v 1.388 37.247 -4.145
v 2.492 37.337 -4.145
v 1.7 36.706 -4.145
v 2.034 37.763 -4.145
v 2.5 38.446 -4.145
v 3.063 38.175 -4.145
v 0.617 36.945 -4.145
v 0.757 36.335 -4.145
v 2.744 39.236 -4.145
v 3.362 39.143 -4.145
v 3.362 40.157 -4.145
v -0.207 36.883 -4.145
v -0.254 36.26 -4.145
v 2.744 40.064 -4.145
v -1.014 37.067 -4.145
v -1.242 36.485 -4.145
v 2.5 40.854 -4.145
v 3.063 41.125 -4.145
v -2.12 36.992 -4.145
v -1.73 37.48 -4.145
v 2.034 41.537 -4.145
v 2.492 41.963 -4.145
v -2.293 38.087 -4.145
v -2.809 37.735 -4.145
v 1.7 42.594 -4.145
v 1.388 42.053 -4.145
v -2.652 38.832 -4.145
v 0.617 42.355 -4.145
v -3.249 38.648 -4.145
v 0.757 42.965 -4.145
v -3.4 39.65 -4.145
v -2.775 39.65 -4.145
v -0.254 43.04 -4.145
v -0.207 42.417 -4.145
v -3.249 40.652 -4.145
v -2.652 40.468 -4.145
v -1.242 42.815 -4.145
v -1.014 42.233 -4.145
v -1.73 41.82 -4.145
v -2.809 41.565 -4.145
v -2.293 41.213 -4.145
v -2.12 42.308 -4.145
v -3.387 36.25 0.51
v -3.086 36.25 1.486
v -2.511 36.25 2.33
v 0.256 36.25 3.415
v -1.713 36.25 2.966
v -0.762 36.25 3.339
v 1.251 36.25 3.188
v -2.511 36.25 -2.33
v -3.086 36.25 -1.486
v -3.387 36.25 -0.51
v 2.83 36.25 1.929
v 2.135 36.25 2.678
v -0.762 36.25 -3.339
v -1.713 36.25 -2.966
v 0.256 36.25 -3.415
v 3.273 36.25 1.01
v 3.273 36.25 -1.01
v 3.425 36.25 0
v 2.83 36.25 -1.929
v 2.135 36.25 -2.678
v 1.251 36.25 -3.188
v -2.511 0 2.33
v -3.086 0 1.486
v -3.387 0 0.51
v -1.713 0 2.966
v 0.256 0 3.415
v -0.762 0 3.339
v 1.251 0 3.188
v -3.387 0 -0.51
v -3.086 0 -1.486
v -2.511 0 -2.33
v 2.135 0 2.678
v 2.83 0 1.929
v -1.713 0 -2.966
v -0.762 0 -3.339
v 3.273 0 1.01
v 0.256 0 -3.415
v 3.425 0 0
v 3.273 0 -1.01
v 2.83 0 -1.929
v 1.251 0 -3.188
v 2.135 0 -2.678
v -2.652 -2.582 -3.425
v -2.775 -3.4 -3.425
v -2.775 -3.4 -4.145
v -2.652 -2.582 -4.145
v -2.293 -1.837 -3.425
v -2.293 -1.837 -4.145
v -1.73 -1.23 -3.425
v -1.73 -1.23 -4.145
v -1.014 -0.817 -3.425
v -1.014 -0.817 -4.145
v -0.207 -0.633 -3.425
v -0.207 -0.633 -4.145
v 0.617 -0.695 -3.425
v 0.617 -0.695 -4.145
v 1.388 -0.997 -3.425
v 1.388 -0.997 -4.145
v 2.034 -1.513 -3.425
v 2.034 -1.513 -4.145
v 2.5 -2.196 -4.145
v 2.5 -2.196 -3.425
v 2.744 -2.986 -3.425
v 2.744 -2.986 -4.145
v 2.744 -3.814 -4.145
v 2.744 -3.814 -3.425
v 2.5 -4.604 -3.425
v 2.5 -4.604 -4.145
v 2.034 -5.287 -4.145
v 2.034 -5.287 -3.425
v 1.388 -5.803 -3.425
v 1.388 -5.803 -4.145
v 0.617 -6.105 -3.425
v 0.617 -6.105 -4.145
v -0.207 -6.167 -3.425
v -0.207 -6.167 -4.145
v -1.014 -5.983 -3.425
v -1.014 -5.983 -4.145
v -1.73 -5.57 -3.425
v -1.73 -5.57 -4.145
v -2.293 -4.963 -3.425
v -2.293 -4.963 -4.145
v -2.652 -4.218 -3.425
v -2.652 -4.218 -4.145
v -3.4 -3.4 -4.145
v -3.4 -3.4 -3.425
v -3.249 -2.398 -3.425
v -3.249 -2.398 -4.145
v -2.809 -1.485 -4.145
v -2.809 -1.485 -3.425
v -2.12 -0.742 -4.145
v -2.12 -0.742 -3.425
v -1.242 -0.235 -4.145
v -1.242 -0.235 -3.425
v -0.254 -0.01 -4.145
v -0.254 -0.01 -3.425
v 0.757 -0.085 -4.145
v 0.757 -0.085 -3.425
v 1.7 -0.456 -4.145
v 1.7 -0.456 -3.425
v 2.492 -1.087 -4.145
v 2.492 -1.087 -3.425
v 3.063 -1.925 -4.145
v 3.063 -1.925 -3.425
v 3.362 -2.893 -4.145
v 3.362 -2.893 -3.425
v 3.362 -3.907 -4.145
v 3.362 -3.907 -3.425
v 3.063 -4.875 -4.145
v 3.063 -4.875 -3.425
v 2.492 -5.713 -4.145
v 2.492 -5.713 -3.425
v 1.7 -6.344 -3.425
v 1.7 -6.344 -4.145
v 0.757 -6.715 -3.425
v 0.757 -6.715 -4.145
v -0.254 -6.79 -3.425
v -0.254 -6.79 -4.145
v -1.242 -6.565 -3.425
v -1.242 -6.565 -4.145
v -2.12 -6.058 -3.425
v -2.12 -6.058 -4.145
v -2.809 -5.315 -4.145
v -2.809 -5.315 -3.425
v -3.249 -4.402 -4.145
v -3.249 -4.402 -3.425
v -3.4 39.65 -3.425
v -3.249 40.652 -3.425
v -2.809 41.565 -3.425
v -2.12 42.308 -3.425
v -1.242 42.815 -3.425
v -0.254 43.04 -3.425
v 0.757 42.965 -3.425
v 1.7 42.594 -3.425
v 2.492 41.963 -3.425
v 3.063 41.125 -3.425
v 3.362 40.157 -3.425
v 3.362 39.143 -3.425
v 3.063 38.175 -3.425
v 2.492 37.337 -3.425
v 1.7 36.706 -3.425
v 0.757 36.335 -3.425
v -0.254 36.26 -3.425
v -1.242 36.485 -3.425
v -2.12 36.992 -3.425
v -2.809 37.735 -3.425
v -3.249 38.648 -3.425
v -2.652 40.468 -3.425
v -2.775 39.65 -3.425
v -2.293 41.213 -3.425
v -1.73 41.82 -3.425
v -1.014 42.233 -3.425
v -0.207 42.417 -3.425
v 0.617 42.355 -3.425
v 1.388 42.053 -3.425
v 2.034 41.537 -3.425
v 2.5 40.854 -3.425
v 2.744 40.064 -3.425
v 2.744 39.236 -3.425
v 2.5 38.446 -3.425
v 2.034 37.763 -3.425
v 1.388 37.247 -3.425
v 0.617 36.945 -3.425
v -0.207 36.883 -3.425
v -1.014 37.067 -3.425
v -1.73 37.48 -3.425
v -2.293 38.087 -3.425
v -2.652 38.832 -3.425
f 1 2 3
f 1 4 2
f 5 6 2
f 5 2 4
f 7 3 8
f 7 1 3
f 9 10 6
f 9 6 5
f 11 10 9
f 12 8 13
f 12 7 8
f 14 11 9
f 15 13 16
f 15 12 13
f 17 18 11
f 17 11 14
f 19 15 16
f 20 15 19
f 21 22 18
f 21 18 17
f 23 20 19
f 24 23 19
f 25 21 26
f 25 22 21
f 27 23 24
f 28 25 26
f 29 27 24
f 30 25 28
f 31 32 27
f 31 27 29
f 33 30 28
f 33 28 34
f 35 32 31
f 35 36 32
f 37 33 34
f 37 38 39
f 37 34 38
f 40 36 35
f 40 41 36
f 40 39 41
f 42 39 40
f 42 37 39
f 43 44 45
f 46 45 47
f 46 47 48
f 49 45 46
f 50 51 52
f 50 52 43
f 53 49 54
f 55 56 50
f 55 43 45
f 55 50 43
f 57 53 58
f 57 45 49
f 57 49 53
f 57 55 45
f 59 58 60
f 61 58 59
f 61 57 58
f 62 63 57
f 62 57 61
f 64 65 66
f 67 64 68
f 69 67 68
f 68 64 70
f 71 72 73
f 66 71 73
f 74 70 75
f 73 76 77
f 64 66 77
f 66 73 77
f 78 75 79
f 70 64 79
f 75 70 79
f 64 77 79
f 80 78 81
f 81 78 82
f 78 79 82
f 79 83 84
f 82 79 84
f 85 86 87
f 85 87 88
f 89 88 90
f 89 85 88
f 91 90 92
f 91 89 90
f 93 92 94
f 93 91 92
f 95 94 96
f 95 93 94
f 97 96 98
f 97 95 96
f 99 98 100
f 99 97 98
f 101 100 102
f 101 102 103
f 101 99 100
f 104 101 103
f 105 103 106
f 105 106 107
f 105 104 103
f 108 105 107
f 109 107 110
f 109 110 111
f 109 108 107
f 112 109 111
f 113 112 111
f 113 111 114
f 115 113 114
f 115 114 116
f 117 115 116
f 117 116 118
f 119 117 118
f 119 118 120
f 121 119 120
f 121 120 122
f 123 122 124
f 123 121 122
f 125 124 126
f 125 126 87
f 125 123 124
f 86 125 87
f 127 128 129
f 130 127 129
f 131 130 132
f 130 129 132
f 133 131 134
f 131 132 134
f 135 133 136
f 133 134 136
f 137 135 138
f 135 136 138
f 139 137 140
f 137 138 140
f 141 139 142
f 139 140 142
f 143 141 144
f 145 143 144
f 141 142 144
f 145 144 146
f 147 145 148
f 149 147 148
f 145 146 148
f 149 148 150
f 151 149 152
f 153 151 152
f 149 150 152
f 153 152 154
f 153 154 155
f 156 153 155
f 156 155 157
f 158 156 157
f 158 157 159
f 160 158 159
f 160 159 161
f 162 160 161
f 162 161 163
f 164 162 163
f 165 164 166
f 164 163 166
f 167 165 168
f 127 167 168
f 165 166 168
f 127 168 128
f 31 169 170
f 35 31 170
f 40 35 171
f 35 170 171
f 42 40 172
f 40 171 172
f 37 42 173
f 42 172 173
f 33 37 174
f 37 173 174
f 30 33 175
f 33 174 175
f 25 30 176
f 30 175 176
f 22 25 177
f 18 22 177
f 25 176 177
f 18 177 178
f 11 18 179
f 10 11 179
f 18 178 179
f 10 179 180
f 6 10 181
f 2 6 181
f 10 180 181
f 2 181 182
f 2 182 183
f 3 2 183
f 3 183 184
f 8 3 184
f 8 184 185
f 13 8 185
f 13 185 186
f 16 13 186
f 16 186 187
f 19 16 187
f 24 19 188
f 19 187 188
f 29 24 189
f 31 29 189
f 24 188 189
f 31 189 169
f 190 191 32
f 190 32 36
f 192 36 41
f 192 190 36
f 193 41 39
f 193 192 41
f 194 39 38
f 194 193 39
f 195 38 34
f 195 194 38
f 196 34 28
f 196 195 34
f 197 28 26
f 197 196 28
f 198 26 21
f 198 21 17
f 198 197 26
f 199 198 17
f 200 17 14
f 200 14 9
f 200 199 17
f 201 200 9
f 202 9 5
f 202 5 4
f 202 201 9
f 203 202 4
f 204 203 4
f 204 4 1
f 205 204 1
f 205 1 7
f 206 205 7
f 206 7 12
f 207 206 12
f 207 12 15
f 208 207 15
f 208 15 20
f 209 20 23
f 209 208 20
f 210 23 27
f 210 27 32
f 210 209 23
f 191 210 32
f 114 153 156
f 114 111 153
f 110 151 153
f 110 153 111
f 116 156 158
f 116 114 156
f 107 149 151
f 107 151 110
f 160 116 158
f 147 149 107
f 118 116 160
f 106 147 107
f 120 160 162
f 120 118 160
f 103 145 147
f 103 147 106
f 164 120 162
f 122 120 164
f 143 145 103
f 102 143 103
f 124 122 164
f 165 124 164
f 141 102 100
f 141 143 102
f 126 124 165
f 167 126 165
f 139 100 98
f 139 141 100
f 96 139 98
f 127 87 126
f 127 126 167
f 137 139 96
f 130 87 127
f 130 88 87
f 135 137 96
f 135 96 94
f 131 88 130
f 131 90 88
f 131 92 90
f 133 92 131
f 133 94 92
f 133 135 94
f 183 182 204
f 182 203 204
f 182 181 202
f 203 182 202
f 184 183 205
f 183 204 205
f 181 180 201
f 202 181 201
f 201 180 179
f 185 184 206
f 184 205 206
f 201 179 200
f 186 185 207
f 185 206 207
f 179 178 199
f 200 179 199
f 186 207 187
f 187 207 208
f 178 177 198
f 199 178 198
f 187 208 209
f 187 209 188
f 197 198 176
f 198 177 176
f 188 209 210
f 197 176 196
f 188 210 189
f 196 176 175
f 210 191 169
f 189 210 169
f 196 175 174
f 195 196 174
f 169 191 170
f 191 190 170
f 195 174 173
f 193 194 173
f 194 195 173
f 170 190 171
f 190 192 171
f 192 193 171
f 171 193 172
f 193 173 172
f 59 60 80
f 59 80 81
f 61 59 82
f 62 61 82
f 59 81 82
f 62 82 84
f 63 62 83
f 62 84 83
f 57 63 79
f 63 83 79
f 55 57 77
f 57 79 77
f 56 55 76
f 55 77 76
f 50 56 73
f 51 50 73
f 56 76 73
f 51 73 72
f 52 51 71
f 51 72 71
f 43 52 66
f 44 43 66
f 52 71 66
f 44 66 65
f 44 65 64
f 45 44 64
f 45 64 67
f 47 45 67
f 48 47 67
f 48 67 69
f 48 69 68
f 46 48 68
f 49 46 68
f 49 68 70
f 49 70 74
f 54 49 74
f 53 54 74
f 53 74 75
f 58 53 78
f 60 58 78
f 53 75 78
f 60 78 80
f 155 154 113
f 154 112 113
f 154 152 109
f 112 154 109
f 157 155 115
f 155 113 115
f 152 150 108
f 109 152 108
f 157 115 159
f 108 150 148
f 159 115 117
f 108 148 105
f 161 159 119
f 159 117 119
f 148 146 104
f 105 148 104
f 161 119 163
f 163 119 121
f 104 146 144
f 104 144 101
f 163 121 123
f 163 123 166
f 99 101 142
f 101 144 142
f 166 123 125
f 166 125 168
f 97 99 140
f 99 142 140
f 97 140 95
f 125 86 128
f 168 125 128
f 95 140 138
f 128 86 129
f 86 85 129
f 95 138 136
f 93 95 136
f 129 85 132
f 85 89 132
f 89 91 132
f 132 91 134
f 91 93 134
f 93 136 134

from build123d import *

# Parameters (mm, degrees)
SKETCH1_R             = 3.425
BOSS_EXTRUDE1_DEPTH   = 36.25
SKETCH2_R             = 3.4
SKETCH2_R_2           = 2.775
BOSS_EXTRUDE2_DEPTH   = 0.72
BOSS_EXTRUDE2_2_DEPTH = 0.72


with BuildPart() as part:
    # Sketch1 → Boss-Extrude1 (new body)
    with BuildSketch(Plane(origin=(0, 0, 0), x_dir=(1, 0, 0), z_dir=(0, 1, 0))):
        Circle(SKETCH1_R)
    extrude(amount=BOSS_EXTRUDE1_DEPTH)


with BuildPart() as body_2:
    # Sketch2 → Boss-Extrude2 (new body)
    with BuildSketch(Plane(origin=(0, 0, -3.425), x_dir=(-1, 0, 0), z_dir=(0, 0, -1))):
        with Locations((0, 39.65)):
            Circle(SKETCH2_R)
        with Locations((0, 39.65)):
            Circle(SKETCH2_R_2, mode=Mode.SUBTRACT)
    extrude(amount=BOSS_EXTRUDE2_DEPTH)


with BuildPart() as body_3:
    # Sketch2 → Boss-Extrude2 2 (new body)
    with BuildSketch(Plane(origin=(0, 0, -3.425), x_dir=(-1, 0, 0), z_dir=(0, 0, -1))):
        with Locations((0, -3.4)):
            Circle(SKETCH2_R)
        with Locations((0, -3.4)):
            Circle(SKETCH2_R_2, mode=Mode.SUBTRACT)
    extrude(amount=BOSS_EXTRUDE2_2_DEPTH)


solid = Compound([part.part, body_2.part, body_3.part])
